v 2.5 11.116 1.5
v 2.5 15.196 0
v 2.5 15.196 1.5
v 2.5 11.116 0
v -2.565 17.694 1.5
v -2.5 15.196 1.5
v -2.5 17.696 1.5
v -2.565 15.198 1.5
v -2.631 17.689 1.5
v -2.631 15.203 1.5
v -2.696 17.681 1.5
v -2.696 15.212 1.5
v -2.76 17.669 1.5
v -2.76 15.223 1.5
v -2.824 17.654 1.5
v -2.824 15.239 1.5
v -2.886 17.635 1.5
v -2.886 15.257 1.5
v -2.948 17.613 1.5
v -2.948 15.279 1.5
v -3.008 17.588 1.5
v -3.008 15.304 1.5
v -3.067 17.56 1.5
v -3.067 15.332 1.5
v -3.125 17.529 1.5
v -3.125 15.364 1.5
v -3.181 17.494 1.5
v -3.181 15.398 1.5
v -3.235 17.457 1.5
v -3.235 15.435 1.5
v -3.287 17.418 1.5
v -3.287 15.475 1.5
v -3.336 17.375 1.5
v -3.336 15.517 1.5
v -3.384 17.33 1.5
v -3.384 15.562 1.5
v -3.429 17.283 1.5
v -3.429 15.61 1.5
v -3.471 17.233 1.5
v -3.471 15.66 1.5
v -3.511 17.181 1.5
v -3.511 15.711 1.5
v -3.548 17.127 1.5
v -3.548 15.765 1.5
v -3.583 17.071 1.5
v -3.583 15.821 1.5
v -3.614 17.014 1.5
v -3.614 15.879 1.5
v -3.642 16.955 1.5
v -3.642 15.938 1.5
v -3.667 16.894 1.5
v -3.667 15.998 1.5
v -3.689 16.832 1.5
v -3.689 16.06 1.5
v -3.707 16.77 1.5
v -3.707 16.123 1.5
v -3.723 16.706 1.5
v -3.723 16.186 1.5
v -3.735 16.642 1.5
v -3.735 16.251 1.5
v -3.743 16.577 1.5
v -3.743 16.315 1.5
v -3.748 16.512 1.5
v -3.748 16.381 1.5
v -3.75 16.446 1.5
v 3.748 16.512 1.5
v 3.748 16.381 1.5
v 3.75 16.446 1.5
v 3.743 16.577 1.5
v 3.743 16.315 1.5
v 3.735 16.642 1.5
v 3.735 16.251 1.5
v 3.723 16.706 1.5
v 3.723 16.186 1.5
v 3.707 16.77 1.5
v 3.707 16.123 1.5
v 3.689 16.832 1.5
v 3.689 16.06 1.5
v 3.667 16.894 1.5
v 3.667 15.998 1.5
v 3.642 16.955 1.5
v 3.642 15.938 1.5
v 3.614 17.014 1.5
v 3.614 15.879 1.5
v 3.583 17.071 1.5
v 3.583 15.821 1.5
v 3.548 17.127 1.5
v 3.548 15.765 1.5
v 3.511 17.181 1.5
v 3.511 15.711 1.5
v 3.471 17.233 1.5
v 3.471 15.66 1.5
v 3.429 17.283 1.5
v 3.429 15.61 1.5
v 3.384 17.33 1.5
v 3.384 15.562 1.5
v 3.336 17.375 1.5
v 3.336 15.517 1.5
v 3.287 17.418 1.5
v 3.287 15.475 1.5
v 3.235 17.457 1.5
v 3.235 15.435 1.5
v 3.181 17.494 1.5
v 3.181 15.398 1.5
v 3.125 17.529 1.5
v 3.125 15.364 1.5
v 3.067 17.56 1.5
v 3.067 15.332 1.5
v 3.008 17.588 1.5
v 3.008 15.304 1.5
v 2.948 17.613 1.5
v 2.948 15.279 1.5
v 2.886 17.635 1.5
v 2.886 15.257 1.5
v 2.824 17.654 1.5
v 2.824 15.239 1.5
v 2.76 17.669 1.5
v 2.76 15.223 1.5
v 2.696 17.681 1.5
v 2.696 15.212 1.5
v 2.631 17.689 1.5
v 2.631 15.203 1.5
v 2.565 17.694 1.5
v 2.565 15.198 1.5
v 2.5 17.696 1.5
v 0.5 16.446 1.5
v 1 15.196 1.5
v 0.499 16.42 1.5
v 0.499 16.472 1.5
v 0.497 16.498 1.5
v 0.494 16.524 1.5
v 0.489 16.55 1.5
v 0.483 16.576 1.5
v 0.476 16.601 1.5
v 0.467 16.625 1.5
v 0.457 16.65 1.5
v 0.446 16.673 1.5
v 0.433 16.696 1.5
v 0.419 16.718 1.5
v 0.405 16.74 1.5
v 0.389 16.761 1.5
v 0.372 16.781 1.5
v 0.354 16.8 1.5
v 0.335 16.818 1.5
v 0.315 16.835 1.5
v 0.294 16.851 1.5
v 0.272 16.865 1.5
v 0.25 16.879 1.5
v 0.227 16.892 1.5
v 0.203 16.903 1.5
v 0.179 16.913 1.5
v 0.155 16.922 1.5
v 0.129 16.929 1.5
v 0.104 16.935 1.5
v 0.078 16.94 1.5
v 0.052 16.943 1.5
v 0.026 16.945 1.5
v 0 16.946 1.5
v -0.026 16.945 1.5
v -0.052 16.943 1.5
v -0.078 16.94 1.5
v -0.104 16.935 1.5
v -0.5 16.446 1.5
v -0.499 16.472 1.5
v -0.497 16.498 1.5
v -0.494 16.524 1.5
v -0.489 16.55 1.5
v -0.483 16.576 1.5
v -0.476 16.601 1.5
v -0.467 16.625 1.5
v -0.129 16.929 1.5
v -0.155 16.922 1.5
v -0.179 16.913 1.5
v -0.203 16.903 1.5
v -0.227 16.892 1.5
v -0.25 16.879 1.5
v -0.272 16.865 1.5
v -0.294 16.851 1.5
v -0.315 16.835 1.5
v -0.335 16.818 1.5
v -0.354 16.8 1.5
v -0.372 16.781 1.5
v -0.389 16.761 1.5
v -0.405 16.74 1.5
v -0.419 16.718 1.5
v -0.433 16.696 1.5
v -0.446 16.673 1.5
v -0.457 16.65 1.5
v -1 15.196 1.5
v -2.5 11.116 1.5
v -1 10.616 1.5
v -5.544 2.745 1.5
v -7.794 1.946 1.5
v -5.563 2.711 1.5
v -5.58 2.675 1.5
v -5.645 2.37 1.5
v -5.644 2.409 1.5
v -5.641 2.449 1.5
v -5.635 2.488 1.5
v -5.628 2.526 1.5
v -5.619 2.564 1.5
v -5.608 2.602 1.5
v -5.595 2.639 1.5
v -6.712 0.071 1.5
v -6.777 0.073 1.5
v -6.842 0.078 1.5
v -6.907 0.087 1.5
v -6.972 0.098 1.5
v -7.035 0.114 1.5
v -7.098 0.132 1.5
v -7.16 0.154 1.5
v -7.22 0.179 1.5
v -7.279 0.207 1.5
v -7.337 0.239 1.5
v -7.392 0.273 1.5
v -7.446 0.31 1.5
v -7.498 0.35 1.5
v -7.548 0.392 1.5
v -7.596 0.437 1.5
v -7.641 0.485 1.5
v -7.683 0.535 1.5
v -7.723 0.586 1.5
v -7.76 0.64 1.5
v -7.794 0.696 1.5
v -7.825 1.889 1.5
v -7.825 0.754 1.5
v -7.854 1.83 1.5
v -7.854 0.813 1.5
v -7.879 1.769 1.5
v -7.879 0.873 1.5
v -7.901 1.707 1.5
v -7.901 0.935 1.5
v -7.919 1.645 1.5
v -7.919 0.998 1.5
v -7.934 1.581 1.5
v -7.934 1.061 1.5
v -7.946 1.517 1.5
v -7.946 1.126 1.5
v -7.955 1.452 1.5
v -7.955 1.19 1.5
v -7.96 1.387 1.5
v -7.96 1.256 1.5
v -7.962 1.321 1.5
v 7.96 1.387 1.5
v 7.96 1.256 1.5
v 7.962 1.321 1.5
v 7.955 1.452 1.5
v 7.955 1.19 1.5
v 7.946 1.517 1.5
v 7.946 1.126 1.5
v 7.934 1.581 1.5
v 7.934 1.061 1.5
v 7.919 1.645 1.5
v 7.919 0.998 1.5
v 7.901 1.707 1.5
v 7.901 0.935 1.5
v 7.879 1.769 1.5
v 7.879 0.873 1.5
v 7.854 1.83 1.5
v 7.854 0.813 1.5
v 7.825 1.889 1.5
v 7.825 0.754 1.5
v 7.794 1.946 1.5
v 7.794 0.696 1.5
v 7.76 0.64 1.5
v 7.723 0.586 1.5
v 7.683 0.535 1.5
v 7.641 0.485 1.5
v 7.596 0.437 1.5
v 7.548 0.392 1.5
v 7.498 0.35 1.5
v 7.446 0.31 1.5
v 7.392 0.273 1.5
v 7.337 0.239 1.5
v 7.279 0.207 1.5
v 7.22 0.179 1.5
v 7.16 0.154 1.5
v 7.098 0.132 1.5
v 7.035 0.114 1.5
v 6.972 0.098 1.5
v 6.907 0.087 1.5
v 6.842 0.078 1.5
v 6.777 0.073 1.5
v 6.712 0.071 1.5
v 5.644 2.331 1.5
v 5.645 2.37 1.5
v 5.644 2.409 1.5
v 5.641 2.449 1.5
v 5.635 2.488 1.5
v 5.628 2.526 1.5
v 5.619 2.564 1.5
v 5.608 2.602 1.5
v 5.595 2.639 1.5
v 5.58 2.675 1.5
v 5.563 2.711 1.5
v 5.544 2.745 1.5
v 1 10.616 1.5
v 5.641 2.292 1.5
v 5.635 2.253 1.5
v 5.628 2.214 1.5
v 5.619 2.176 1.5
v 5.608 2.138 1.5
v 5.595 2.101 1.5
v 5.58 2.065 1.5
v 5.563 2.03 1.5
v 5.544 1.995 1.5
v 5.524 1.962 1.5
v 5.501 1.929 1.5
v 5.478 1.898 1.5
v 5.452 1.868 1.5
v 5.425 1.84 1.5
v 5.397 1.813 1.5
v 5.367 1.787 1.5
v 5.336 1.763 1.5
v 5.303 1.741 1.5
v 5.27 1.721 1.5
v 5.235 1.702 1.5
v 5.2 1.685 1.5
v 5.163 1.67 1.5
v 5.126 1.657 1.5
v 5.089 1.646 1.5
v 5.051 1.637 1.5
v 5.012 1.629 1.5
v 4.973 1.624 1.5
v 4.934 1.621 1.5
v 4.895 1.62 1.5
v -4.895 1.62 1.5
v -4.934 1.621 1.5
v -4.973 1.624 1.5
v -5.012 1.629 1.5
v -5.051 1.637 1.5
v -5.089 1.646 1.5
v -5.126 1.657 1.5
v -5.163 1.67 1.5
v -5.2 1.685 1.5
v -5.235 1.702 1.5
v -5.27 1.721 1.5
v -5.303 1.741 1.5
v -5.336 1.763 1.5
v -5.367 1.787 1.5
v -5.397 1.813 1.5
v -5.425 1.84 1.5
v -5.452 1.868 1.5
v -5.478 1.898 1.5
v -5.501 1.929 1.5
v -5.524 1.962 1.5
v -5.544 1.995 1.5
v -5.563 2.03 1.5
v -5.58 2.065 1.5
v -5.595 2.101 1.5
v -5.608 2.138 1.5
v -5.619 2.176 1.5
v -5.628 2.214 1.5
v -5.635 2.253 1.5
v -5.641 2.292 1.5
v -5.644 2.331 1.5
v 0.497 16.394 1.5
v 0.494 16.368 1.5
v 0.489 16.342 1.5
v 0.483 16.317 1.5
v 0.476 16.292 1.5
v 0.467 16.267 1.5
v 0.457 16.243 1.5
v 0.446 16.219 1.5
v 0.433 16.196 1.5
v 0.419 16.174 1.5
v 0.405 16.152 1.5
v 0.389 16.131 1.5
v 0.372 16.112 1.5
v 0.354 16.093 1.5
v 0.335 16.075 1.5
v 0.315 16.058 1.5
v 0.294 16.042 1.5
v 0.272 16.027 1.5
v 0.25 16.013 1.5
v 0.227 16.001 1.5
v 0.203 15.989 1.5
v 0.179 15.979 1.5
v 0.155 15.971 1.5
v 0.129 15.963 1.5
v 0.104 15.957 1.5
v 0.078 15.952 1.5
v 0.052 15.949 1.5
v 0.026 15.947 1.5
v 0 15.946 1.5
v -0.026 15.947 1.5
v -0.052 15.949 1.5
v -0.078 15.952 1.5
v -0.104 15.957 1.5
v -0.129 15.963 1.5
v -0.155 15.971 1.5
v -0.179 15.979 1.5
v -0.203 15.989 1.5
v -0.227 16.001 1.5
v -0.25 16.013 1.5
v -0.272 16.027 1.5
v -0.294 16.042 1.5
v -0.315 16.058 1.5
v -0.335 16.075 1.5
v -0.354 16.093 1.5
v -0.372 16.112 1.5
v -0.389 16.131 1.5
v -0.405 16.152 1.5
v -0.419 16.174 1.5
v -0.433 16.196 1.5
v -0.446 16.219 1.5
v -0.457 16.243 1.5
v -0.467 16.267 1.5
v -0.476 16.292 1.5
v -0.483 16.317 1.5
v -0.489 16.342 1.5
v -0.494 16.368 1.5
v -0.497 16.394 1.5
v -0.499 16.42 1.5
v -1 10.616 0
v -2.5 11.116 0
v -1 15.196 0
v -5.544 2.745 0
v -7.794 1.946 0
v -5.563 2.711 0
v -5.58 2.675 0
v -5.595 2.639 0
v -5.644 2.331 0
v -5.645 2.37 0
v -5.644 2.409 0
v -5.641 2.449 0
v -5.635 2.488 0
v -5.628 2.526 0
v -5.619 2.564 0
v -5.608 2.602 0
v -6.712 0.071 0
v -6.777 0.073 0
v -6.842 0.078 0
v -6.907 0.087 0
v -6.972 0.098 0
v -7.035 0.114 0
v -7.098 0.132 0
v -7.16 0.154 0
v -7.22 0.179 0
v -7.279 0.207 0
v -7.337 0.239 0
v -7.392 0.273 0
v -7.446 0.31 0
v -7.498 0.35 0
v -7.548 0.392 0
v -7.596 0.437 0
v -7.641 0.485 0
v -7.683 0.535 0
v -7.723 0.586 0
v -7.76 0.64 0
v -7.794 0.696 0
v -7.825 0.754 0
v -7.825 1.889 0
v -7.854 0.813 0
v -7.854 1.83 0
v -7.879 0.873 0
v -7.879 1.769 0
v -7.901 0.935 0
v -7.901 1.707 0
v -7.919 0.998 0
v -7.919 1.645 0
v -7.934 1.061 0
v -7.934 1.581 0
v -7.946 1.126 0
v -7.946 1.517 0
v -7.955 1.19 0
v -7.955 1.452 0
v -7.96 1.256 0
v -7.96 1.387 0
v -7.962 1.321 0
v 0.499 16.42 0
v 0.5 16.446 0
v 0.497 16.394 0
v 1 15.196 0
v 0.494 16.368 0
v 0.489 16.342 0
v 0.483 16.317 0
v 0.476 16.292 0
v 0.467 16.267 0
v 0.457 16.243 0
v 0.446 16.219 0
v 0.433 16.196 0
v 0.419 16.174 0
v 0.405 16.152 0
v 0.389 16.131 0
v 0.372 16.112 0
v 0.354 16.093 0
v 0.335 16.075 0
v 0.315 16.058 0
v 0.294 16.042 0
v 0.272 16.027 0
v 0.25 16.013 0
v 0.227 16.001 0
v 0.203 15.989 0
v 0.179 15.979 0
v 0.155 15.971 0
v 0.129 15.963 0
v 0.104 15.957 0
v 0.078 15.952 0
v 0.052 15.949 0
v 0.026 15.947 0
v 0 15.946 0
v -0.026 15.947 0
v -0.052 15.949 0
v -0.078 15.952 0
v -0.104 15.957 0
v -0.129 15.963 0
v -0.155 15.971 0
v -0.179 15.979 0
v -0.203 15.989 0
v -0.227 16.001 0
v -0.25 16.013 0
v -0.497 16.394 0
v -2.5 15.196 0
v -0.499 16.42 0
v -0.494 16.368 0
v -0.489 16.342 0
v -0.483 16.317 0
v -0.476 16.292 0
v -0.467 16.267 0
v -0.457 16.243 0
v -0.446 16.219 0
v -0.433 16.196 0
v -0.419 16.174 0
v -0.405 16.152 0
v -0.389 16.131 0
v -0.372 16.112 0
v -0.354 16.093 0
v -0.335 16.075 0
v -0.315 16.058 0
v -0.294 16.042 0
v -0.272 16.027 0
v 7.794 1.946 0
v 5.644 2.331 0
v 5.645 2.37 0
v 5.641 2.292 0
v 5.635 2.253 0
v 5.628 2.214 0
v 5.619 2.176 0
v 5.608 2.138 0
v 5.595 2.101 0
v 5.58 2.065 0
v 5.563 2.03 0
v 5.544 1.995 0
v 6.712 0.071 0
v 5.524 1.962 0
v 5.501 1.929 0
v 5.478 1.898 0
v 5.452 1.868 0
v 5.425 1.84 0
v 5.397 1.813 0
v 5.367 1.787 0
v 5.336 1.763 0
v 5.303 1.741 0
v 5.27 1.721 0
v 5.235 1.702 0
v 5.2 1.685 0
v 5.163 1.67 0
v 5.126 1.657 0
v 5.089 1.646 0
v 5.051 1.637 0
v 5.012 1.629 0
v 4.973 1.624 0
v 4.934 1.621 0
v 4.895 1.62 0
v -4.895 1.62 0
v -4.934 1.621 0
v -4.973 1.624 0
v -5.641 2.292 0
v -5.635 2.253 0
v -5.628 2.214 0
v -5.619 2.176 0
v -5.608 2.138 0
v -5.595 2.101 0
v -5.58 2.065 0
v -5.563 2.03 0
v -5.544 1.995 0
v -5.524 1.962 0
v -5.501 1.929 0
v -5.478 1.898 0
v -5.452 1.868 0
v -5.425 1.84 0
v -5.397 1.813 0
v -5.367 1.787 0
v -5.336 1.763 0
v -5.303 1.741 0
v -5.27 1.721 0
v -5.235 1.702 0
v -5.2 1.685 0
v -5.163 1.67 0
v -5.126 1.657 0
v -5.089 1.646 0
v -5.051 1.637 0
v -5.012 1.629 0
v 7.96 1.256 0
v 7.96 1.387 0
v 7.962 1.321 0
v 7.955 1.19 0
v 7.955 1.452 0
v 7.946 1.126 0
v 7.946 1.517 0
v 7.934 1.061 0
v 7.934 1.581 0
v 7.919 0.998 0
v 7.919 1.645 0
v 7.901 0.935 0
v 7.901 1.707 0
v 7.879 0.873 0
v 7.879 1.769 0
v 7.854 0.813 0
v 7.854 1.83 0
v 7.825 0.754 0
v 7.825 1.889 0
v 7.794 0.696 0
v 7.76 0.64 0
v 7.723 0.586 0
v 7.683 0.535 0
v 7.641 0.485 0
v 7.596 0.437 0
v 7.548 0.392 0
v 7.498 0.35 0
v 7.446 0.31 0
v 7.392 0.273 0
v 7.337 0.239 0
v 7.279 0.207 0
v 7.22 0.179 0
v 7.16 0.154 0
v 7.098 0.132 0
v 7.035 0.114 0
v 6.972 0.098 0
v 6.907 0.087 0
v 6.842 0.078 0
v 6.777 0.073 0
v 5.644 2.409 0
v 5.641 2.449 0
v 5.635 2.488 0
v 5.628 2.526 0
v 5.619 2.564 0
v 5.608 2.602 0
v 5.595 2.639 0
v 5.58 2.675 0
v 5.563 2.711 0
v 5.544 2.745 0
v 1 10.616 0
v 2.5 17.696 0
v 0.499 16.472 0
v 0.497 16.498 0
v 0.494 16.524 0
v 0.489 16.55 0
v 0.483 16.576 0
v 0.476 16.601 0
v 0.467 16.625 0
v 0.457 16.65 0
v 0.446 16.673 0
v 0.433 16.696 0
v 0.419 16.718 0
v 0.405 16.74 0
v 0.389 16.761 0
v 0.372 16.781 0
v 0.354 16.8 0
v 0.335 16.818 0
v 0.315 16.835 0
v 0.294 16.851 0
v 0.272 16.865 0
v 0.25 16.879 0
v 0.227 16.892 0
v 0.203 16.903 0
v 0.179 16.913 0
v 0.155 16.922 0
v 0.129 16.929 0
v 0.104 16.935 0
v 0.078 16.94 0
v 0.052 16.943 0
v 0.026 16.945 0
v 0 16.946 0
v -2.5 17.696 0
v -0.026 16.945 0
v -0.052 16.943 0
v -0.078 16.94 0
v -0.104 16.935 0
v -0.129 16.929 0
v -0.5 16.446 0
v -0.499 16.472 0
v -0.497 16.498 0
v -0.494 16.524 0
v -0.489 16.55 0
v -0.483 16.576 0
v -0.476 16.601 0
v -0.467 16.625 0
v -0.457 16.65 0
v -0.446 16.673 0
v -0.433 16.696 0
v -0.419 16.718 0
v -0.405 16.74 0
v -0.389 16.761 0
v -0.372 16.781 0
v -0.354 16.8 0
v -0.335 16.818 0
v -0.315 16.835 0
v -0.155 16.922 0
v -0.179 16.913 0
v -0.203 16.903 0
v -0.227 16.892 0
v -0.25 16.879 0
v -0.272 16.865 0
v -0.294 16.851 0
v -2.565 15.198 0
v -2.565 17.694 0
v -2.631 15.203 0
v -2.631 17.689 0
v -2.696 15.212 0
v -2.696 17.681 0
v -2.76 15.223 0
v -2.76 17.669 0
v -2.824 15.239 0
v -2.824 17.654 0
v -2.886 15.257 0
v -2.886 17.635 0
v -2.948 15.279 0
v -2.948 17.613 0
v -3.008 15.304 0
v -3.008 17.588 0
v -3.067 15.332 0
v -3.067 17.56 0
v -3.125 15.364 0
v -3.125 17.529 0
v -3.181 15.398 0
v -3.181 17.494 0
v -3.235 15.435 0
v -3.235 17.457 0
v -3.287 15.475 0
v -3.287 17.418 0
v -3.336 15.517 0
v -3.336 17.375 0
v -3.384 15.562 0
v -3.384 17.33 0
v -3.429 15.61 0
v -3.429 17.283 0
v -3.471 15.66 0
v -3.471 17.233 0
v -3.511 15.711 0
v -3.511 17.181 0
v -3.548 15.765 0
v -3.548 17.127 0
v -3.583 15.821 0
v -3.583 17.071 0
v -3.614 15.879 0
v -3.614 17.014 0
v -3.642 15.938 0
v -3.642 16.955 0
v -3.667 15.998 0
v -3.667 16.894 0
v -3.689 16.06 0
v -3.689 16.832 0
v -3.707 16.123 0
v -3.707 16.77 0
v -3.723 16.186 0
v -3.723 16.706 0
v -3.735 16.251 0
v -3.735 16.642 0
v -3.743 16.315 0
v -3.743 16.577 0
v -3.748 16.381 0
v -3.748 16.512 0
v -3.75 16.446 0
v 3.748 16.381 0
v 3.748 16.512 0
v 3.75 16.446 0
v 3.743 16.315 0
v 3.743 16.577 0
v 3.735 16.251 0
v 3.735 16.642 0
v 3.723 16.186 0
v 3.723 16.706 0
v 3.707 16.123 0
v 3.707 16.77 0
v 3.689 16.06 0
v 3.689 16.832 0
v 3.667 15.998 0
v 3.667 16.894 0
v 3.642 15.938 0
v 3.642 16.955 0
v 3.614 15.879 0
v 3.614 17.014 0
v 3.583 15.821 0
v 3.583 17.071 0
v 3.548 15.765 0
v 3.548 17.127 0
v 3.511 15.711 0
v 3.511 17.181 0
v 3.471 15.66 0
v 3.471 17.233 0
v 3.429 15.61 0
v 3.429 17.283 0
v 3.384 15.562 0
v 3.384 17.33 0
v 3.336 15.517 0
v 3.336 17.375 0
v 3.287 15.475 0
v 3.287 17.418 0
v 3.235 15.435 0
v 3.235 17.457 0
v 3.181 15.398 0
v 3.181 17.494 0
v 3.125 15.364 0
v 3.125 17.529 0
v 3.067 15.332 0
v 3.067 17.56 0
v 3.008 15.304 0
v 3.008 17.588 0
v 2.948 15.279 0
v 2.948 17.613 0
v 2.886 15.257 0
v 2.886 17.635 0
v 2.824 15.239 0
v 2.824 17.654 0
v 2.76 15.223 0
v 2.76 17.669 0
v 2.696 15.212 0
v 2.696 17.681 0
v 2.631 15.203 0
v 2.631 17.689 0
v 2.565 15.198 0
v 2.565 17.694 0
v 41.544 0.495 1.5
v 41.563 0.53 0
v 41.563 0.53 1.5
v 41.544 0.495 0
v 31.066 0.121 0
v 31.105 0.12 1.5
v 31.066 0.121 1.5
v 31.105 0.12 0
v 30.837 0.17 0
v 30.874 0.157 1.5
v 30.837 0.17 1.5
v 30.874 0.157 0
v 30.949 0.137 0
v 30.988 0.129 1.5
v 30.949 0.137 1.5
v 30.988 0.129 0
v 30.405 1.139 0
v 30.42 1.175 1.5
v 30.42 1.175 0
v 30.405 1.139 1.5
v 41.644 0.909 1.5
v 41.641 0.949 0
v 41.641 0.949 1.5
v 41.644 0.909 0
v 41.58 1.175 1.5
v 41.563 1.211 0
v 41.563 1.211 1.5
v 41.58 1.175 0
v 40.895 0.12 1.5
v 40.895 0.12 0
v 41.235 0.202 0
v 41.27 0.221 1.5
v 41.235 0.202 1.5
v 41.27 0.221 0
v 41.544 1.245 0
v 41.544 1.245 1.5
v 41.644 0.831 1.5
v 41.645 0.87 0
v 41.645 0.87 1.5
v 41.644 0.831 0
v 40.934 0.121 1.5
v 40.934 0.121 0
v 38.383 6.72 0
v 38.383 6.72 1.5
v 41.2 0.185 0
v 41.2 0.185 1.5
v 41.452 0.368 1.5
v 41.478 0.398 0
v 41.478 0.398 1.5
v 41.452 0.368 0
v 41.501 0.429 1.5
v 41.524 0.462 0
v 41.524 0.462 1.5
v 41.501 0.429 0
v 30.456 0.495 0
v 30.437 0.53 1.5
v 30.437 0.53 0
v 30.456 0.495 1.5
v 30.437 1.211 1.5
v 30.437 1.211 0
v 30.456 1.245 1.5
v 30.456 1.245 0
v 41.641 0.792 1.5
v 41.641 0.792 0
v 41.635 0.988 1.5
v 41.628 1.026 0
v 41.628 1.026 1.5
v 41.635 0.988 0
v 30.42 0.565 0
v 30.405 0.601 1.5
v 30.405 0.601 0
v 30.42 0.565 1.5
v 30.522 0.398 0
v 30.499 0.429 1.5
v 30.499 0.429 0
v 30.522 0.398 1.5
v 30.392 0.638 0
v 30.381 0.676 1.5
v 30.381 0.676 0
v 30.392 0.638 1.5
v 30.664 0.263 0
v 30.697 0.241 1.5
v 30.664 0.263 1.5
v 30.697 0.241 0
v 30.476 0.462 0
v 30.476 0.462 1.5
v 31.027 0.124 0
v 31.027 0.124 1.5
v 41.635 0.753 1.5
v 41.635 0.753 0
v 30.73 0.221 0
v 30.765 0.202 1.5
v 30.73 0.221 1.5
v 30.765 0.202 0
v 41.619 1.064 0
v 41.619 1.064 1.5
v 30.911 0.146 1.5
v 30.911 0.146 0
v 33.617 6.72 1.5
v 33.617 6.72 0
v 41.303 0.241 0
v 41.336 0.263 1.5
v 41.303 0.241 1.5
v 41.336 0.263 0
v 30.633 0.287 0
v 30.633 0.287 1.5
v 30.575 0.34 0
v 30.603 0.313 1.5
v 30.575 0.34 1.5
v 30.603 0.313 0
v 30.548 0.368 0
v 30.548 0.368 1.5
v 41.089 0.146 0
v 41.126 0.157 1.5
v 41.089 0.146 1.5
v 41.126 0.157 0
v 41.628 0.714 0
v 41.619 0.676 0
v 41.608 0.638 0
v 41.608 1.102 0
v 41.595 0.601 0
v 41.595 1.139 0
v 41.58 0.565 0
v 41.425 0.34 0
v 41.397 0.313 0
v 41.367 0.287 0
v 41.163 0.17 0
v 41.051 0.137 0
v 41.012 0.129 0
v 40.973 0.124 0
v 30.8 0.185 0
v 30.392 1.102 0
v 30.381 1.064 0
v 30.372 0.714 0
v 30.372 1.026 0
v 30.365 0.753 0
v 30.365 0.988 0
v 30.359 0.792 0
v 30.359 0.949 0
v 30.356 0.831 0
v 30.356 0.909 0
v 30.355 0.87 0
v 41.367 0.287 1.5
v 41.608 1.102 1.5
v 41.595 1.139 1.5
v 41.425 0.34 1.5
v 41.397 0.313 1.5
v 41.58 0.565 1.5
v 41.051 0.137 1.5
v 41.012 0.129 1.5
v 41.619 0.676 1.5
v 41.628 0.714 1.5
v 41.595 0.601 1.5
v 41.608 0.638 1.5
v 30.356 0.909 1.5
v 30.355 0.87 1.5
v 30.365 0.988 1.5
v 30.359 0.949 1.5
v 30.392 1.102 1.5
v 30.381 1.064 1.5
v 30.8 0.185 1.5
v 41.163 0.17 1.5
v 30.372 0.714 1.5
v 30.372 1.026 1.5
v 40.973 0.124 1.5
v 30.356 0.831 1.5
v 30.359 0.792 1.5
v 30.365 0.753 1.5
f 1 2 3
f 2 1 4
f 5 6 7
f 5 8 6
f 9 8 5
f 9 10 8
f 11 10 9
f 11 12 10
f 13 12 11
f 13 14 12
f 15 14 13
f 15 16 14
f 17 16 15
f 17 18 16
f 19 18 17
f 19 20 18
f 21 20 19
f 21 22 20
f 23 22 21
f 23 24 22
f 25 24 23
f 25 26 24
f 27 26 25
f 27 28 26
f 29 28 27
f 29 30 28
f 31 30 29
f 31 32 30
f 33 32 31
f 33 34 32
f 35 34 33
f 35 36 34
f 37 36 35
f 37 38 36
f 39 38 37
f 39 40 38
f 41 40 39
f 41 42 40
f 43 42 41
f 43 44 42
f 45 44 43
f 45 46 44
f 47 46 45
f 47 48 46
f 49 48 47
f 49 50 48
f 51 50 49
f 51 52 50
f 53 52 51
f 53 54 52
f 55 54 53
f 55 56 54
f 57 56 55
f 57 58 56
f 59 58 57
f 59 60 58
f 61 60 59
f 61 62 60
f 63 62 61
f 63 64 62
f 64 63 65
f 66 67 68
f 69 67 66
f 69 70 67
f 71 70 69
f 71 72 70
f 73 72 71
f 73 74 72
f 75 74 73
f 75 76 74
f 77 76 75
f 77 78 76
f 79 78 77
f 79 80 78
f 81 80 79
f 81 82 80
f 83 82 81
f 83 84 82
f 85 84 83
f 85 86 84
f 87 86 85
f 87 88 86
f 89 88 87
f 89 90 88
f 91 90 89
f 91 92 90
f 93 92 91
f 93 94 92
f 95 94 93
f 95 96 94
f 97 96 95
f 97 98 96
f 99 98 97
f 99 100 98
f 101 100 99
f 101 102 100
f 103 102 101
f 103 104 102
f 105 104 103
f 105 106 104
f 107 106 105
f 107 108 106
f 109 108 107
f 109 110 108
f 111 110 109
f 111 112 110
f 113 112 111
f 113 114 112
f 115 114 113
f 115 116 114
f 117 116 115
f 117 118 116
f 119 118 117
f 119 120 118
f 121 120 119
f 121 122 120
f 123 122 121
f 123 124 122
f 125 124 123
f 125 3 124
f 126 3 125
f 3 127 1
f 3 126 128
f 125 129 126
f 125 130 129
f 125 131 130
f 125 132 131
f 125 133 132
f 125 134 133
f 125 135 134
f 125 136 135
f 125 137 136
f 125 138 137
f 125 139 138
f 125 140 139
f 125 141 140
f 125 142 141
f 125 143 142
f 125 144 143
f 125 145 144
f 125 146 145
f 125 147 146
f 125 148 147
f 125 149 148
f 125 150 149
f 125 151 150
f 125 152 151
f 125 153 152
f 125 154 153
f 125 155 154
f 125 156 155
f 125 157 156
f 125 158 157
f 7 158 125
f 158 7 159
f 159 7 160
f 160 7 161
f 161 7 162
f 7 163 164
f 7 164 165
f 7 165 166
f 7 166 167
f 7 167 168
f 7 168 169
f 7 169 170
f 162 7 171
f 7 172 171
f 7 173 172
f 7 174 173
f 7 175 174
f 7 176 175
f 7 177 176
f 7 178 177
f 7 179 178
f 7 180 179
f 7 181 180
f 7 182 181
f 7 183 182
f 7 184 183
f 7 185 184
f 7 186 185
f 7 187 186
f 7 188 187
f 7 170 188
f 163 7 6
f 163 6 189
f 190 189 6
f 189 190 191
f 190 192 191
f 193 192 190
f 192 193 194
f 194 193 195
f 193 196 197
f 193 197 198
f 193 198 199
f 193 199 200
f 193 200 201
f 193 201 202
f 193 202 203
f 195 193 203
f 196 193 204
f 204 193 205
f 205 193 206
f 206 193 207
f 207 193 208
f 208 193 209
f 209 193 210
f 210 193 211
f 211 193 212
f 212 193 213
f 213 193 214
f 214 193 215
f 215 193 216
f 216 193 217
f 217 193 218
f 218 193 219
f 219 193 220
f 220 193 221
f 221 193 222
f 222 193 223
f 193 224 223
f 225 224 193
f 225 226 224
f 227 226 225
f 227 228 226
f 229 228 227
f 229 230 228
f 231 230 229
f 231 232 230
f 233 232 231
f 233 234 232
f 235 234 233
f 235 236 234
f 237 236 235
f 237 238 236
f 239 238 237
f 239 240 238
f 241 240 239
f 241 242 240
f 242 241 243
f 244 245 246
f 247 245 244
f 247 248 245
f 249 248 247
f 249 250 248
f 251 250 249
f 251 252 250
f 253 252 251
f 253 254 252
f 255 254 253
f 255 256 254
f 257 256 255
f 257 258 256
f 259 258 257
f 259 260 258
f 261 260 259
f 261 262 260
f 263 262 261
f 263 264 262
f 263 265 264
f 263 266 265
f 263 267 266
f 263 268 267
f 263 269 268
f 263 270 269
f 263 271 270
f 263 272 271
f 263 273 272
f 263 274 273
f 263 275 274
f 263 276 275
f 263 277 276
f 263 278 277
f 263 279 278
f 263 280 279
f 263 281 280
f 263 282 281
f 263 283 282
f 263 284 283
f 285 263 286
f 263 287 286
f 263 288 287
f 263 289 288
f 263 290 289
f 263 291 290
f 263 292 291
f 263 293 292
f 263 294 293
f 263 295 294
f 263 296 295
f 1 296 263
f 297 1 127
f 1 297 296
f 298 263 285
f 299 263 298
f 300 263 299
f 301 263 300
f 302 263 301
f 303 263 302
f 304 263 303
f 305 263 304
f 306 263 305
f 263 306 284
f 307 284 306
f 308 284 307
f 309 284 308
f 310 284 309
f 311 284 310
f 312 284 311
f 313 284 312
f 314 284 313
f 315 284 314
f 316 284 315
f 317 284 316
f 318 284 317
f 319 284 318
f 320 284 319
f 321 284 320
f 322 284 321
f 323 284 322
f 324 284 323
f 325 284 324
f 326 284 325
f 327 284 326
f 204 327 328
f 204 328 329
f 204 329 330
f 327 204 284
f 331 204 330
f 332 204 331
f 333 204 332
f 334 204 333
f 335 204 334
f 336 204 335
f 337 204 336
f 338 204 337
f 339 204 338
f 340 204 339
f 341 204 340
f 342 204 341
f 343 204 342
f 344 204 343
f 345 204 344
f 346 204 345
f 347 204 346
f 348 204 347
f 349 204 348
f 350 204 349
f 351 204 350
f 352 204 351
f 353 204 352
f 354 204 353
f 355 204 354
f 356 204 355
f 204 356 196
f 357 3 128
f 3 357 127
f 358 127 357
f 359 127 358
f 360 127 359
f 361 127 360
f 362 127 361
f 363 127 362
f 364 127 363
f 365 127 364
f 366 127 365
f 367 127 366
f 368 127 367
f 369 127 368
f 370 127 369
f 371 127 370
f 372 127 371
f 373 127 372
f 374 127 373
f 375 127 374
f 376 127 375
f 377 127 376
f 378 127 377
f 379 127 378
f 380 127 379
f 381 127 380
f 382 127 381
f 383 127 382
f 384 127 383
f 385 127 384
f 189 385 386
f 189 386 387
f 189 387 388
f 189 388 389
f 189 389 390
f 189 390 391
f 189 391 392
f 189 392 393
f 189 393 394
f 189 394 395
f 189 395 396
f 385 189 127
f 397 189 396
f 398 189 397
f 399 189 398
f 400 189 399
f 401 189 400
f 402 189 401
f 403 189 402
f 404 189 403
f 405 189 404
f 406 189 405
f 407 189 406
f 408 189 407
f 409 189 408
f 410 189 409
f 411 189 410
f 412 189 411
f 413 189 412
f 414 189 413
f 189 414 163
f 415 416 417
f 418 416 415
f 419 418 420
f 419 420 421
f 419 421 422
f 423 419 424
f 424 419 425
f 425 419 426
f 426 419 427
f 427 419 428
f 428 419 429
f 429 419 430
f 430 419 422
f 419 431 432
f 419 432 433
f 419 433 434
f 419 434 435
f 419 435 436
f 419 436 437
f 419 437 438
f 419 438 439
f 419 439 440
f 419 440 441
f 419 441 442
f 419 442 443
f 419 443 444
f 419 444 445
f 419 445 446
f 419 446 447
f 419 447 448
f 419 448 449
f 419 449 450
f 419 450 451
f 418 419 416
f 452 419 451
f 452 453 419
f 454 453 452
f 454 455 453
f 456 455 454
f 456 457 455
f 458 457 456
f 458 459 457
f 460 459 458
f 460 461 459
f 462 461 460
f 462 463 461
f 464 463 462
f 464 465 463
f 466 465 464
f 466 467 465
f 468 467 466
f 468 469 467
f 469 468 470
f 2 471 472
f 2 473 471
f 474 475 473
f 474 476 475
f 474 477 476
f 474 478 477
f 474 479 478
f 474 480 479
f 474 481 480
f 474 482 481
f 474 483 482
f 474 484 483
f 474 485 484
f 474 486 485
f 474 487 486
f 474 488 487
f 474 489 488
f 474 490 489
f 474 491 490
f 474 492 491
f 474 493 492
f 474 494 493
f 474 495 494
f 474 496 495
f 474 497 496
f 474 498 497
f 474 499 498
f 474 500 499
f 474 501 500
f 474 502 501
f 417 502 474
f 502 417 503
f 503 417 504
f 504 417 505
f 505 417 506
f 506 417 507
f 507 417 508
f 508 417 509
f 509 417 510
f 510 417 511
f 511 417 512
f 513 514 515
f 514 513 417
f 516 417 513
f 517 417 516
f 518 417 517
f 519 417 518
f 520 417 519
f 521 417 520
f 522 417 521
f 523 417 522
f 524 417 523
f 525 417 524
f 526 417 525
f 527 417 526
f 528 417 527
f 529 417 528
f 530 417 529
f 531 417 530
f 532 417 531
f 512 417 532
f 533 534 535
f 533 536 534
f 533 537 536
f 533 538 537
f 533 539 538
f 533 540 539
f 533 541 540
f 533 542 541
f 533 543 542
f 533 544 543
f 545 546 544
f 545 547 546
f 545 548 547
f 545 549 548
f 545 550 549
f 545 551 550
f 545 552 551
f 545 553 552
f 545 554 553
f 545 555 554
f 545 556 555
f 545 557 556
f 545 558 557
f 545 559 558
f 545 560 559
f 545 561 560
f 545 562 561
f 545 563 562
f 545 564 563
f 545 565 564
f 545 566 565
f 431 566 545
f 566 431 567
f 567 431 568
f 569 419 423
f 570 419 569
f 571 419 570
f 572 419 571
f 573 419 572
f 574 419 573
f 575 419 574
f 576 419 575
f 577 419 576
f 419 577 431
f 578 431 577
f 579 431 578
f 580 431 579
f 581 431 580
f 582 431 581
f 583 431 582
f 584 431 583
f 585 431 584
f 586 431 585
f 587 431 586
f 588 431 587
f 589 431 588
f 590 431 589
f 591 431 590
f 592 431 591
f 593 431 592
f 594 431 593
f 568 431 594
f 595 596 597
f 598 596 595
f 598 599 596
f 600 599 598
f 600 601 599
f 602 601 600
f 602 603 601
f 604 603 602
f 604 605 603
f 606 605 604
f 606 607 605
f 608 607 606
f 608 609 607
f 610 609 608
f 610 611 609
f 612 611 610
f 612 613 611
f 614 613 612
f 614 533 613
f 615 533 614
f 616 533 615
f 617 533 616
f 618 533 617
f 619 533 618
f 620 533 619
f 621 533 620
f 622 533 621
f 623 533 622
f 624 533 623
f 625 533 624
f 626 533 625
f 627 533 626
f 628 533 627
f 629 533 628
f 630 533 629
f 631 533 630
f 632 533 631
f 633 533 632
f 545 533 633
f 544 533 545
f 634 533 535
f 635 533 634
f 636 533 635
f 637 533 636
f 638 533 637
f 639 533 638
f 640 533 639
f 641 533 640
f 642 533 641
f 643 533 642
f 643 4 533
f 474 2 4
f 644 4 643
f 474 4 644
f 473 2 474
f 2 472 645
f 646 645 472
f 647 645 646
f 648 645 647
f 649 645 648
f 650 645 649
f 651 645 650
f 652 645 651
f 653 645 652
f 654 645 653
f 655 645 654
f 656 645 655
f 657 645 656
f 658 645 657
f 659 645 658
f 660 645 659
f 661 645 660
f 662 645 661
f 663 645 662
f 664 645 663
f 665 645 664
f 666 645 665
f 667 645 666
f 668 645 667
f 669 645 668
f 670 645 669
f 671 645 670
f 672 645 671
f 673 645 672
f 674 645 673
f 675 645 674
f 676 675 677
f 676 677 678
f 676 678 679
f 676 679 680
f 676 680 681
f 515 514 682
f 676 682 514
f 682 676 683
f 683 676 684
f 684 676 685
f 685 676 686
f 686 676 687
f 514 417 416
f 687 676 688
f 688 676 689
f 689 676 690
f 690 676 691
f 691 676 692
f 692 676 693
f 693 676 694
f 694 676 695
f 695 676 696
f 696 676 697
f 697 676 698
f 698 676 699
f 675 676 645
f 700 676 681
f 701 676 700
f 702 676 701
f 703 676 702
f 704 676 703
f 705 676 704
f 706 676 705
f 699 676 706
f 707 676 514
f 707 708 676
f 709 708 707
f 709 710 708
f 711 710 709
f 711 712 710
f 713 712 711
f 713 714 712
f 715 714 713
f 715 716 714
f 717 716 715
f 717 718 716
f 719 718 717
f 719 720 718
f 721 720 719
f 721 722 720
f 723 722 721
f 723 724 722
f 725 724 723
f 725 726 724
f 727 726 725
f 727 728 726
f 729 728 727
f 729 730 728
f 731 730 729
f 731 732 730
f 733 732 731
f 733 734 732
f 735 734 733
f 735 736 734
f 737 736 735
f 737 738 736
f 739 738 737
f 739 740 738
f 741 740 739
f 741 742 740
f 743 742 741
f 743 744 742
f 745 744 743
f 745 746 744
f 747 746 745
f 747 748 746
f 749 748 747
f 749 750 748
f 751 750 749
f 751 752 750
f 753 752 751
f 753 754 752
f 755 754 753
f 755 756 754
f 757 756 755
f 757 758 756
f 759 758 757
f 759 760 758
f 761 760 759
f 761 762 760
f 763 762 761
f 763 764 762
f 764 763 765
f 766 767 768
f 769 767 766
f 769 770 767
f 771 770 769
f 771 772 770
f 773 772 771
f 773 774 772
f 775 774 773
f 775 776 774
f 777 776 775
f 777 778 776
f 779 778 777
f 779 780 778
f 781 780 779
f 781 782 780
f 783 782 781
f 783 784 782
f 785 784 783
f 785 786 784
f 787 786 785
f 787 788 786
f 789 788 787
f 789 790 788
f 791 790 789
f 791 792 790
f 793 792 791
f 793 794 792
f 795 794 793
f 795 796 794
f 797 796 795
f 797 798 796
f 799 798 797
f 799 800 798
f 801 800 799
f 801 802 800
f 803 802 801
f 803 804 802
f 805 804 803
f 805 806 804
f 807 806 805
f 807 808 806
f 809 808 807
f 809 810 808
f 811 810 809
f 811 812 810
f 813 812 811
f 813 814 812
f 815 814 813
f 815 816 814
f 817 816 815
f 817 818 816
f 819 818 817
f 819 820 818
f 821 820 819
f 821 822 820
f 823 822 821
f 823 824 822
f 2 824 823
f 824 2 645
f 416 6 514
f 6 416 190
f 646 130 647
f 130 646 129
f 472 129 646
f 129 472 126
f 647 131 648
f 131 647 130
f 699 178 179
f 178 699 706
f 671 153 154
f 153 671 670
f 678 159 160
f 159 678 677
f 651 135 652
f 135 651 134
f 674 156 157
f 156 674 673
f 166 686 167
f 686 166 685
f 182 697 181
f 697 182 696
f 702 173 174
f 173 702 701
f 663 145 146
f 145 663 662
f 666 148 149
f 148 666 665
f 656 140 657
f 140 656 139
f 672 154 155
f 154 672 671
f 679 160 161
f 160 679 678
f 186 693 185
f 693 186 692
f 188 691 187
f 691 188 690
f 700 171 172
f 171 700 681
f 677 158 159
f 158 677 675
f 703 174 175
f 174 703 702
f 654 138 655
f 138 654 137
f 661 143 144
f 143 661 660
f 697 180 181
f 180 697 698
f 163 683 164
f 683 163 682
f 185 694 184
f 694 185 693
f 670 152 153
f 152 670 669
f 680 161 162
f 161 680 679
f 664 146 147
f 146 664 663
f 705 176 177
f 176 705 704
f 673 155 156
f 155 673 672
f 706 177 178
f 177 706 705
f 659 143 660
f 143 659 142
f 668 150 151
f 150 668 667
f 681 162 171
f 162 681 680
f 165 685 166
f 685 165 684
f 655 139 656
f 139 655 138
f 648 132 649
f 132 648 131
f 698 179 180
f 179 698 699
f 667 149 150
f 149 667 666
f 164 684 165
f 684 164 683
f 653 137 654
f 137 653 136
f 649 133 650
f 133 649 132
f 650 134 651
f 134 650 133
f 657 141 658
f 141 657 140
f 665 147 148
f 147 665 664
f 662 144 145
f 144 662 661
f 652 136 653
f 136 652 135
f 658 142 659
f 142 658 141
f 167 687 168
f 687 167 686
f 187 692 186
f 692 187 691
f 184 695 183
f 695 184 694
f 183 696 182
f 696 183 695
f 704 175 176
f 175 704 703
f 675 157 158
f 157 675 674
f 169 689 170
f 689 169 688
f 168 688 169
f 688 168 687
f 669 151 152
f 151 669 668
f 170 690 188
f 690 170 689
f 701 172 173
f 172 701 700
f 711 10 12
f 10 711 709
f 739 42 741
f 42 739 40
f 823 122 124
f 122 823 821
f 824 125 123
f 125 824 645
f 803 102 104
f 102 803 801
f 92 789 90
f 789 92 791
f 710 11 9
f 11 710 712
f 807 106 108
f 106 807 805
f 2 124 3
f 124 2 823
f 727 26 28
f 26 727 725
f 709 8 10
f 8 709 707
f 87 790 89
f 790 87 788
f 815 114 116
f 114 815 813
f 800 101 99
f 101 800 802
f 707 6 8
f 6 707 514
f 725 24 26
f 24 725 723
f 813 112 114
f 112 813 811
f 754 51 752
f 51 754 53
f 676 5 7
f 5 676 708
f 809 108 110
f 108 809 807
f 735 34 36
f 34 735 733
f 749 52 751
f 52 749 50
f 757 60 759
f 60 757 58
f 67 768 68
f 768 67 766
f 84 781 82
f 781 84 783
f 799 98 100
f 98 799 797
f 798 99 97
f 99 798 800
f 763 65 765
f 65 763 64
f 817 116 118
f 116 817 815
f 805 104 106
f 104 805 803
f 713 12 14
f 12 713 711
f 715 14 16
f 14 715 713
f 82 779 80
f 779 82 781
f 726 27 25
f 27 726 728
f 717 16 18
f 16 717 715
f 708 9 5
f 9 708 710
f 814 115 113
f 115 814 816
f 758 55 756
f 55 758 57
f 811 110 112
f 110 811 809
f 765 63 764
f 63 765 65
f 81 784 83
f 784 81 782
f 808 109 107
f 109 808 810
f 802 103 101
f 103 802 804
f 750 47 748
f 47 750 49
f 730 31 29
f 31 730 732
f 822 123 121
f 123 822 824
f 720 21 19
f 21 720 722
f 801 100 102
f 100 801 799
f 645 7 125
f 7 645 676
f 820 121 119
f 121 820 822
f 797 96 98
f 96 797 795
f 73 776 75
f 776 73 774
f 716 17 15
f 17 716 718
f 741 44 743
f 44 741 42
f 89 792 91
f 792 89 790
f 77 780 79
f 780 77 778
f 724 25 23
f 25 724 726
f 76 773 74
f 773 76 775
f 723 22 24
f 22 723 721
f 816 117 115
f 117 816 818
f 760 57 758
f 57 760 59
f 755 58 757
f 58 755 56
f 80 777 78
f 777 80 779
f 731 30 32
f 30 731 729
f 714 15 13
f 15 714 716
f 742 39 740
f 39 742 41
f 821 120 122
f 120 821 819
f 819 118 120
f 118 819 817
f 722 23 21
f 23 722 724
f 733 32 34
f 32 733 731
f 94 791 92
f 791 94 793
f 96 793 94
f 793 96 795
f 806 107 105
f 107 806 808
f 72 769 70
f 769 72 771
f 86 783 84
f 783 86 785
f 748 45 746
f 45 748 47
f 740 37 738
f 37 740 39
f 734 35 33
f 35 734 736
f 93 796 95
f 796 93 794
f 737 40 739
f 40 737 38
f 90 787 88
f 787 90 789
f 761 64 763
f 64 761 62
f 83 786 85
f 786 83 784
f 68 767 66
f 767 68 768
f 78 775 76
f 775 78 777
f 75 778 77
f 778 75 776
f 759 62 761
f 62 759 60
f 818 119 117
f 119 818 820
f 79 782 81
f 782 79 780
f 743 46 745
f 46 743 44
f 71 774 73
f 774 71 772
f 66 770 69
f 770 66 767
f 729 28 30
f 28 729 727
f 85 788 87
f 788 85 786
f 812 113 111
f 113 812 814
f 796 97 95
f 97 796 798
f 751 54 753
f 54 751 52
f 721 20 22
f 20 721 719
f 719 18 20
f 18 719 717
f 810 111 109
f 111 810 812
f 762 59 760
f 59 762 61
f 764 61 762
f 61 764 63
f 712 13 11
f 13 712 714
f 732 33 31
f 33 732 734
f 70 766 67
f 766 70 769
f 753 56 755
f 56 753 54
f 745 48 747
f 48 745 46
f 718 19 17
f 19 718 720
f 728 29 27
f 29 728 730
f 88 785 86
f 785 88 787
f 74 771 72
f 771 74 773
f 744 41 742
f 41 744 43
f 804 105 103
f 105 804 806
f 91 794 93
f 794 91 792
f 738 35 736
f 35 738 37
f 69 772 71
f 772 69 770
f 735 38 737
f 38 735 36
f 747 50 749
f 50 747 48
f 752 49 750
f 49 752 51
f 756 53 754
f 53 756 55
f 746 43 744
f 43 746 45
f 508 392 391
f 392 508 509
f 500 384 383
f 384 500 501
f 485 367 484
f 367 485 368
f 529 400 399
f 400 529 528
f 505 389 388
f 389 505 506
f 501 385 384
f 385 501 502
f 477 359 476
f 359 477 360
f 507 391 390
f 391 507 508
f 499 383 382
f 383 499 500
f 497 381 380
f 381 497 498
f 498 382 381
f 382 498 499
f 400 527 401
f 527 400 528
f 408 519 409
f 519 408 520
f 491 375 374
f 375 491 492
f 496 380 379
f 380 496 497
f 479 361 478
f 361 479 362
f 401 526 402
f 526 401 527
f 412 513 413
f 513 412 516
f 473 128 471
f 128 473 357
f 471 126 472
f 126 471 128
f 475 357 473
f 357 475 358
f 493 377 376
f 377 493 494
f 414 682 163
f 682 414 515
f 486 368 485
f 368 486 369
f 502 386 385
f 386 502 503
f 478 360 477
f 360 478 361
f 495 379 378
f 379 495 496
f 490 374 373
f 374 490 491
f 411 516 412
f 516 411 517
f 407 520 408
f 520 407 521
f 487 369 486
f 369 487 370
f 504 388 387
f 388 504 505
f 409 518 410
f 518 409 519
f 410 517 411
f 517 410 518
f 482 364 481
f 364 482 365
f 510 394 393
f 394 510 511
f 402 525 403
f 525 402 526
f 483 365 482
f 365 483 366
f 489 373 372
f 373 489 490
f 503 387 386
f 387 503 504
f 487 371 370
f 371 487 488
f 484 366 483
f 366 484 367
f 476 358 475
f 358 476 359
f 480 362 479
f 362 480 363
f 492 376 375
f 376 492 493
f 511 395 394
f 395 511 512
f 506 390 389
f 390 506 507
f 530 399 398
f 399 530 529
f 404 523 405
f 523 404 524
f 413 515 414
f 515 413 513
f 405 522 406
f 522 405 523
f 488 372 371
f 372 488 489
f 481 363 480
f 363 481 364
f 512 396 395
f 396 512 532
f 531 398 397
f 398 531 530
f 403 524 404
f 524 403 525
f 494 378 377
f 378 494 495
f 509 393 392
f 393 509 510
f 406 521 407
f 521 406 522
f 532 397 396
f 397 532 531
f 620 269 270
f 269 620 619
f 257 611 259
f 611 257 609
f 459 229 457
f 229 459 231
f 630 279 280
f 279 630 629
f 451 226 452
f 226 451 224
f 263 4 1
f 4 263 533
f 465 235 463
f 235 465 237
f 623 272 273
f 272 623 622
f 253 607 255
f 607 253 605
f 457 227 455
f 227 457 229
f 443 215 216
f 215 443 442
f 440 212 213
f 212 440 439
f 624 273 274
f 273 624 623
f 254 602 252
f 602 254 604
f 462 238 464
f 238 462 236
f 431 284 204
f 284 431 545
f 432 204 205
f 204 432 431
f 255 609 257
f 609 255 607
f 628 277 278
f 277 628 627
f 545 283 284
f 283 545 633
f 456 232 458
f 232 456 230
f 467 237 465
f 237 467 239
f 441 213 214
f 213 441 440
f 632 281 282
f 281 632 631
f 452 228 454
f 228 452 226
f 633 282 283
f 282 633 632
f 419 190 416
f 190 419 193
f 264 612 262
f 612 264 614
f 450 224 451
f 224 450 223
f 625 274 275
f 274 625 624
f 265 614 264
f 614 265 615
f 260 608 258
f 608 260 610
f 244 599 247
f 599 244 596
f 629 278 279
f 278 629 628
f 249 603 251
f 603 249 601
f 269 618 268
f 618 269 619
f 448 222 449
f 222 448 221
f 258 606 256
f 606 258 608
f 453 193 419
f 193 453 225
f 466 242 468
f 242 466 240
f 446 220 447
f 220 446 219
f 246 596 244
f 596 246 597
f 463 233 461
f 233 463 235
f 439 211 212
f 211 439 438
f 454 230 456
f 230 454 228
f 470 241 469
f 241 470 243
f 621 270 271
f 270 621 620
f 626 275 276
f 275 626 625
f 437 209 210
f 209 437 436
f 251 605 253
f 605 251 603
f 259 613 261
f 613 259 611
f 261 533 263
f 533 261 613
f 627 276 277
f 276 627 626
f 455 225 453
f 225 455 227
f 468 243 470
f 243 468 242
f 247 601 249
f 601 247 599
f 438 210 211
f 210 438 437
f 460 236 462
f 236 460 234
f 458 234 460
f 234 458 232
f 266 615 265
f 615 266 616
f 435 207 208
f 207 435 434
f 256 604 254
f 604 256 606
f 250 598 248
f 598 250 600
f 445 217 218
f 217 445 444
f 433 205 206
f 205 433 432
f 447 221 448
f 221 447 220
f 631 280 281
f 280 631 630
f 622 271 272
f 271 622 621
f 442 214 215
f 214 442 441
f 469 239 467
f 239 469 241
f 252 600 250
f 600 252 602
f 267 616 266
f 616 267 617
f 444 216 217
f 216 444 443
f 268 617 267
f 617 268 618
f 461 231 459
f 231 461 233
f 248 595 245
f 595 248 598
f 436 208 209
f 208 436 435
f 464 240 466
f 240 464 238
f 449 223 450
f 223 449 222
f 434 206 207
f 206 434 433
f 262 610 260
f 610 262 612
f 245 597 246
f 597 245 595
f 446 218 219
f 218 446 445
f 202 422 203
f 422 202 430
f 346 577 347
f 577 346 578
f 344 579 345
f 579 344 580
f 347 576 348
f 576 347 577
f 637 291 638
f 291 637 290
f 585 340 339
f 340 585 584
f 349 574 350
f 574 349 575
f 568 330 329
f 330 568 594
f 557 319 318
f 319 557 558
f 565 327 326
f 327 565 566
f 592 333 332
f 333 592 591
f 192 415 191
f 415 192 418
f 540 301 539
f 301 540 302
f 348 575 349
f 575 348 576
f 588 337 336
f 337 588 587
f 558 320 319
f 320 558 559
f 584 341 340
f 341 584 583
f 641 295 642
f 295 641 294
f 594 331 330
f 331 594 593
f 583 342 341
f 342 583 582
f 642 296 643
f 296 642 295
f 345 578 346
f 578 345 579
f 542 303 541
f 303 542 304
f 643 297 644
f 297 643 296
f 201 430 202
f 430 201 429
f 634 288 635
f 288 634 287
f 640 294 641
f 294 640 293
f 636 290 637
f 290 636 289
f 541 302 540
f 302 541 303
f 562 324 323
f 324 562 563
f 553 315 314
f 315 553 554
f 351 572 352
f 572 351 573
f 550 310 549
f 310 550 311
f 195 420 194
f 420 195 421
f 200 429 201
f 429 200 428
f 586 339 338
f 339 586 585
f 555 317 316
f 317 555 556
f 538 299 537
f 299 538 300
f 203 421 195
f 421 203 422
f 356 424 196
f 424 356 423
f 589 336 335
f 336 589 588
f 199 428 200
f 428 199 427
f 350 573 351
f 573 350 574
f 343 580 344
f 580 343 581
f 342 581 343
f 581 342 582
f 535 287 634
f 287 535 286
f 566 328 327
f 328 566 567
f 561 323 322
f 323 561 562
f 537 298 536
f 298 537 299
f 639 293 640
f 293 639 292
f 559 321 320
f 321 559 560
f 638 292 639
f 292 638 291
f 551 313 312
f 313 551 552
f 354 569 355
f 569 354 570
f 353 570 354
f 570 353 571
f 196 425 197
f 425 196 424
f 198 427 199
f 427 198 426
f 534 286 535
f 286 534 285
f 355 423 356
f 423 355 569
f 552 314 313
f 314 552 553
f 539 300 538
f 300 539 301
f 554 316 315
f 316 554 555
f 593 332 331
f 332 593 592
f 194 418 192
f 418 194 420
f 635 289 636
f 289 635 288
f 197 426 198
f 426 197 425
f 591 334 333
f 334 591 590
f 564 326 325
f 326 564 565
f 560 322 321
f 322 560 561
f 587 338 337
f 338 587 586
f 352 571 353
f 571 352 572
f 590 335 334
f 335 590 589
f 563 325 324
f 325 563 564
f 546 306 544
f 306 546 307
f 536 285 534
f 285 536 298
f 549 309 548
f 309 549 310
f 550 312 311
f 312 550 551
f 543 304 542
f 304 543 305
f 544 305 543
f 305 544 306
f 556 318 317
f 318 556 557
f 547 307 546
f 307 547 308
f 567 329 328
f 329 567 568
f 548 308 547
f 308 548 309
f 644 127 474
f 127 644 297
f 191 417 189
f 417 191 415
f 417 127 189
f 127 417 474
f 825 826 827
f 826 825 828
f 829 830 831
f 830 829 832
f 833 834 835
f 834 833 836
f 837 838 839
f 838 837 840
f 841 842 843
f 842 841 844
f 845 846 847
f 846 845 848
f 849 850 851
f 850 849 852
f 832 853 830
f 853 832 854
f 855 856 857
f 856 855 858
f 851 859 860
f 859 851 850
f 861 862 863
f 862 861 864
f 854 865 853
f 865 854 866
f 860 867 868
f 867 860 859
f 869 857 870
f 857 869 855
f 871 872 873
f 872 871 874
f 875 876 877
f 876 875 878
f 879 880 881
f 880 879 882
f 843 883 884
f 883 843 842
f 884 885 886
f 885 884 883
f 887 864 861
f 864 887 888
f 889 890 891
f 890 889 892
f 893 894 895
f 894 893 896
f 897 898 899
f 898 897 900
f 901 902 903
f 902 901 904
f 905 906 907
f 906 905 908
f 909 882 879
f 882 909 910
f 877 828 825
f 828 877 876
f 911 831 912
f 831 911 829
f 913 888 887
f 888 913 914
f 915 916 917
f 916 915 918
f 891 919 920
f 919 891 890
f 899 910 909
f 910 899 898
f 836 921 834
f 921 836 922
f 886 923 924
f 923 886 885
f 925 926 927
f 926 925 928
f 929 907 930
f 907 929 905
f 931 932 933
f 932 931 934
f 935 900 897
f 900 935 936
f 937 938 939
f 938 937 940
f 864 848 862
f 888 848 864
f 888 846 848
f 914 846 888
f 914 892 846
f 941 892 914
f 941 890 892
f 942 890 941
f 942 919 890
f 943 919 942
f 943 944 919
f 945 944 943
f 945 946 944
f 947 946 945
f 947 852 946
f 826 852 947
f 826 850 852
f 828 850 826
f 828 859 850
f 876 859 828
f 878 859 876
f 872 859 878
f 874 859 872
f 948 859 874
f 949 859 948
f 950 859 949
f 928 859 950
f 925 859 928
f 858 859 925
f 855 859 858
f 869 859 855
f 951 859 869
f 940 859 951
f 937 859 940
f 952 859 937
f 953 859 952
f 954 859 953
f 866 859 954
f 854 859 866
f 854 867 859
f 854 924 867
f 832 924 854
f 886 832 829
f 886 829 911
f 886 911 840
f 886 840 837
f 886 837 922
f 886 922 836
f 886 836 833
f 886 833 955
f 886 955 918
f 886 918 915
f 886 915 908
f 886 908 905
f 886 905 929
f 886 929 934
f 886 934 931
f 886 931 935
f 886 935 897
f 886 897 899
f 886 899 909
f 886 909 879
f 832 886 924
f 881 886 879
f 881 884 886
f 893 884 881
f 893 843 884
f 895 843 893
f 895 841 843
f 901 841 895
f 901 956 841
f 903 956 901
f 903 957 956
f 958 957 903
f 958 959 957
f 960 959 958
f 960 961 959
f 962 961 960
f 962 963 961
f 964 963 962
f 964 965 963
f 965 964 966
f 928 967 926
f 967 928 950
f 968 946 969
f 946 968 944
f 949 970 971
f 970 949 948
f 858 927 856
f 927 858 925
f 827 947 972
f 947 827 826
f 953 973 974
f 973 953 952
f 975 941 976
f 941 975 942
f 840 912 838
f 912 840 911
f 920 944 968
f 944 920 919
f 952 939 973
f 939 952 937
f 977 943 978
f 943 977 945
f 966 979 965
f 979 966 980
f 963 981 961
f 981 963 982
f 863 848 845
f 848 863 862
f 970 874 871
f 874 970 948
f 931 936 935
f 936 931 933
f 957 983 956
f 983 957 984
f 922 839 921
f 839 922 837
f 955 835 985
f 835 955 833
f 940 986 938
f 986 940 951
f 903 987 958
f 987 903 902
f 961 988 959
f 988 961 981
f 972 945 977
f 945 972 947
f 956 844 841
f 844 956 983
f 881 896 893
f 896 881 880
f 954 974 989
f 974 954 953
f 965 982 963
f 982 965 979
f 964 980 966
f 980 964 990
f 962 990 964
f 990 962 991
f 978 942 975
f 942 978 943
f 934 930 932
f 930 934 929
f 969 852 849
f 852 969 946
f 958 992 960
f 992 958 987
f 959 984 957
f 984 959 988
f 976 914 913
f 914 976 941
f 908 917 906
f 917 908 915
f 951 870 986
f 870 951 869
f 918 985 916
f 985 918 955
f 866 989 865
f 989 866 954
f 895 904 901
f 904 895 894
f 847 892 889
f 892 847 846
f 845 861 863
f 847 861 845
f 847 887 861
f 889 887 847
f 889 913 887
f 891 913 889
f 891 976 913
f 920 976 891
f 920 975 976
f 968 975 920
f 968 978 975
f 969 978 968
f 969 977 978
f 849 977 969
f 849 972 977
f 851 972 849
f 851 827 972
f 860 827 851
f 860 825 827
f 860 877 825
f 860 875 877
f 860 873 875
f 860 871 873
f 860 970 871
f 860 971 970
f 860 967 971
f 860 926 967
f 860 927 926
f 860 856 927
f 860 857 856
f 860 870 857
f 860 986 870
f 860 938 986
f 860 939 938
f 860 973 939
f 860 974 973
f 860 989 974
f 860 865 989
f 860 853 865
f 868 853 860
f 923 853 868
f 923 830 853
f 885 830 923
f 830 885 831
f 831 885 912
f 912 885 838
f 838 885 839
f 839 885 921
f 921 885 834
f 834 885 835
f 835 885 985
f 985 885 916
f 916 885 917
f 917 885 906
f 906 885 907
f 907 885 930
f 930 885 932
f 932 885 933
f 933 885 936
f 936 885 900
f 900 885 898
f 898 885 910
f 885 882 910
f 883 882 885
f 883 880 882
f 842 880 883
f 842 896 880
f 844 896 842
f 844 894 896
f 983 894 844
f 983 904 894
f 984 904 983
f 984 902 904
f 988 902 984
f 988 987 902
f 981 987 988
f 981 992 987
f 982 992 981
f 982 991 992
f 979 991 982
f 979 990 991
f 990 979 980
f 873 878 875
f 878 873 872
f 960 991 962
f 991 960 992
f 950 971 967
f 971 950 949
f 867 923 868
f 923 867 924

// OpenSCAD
module rc_triangle(diam = 2.5, height = 1, a = 5){
    //translate([])
        hull(){
            for(i=[0:2]){
                 rotate([0,0,90+i*120]) translate([a-0.5*diam,0,0]) cylinder(d=diam,h=height); 
            }
        }
}

module neck(length = 10, height = 1, neck_width = 4, thickness = 3){

    difference(){
        translate([-neck_width*0.5,0,0]) cube([neck_width,length,height]);
        translate([0,length-0.75,-0.5*height]) cylinder(h=2*height, d=1); 
    }
    
    translate([0,length-0.75,0]){
        // top flask part
        difference(){
            hull(){
                translate([-neck_width*0.5,0,0]) cylinder(h=height, d=thickness);
                translate([neck_width*0.5,0,0]) cylinder(h=height, d=thickness);
            }
            translate([0,0,-0.5*height]) cylinder(h=2*height, d=1);          
        }
    }
}


module flask(a = 9, neck_length = 12, neck_width = 5, thickness = 1.5,  height = 1.5, d_outer = 2.5, d_inner = 1.5){
    translate([0,(sqrt(3)/3)*a,0])
    difference(){
        union(){
            rc_triangle(height=height, diam=d_outer, a=a);
            neck(height=height,length=neck_length, neck_width=neck_width, thickness=2.5);
        }
        union(){
            translate([0,0,-0.5*height])
                rc_triangle(diam=d_inner,a=a-(3/(sqrt(3))*thickness), height=2*height);
            translate([-0.5*(neck_width-2*thickness),0,-0.5])
                cube([neck_width-2*thickness, neck_length-2,2*height]);
       }
    }
    
    translate([4*a,0,0]){
        water(diam=d_inner, a = a-sqrt(3)*thickness, height=height);
    }
    

}

module water(diam=1.5, a=6-sqrt(3), height=1, multiplicator = 0.65){
    
    difference(){
        translate([0,(1/sqrt(3))*a,0]) rc_triangle(diam=diam,a=a, height=height);
        translate([-a,(multiplicator)*((a*sqrt(3))-0.5*diam),-0.5*height]) cube([2*a,2*a,2*height]);
    }
    
}


$fn = $preview ? 36 : 120;

flask() ;
